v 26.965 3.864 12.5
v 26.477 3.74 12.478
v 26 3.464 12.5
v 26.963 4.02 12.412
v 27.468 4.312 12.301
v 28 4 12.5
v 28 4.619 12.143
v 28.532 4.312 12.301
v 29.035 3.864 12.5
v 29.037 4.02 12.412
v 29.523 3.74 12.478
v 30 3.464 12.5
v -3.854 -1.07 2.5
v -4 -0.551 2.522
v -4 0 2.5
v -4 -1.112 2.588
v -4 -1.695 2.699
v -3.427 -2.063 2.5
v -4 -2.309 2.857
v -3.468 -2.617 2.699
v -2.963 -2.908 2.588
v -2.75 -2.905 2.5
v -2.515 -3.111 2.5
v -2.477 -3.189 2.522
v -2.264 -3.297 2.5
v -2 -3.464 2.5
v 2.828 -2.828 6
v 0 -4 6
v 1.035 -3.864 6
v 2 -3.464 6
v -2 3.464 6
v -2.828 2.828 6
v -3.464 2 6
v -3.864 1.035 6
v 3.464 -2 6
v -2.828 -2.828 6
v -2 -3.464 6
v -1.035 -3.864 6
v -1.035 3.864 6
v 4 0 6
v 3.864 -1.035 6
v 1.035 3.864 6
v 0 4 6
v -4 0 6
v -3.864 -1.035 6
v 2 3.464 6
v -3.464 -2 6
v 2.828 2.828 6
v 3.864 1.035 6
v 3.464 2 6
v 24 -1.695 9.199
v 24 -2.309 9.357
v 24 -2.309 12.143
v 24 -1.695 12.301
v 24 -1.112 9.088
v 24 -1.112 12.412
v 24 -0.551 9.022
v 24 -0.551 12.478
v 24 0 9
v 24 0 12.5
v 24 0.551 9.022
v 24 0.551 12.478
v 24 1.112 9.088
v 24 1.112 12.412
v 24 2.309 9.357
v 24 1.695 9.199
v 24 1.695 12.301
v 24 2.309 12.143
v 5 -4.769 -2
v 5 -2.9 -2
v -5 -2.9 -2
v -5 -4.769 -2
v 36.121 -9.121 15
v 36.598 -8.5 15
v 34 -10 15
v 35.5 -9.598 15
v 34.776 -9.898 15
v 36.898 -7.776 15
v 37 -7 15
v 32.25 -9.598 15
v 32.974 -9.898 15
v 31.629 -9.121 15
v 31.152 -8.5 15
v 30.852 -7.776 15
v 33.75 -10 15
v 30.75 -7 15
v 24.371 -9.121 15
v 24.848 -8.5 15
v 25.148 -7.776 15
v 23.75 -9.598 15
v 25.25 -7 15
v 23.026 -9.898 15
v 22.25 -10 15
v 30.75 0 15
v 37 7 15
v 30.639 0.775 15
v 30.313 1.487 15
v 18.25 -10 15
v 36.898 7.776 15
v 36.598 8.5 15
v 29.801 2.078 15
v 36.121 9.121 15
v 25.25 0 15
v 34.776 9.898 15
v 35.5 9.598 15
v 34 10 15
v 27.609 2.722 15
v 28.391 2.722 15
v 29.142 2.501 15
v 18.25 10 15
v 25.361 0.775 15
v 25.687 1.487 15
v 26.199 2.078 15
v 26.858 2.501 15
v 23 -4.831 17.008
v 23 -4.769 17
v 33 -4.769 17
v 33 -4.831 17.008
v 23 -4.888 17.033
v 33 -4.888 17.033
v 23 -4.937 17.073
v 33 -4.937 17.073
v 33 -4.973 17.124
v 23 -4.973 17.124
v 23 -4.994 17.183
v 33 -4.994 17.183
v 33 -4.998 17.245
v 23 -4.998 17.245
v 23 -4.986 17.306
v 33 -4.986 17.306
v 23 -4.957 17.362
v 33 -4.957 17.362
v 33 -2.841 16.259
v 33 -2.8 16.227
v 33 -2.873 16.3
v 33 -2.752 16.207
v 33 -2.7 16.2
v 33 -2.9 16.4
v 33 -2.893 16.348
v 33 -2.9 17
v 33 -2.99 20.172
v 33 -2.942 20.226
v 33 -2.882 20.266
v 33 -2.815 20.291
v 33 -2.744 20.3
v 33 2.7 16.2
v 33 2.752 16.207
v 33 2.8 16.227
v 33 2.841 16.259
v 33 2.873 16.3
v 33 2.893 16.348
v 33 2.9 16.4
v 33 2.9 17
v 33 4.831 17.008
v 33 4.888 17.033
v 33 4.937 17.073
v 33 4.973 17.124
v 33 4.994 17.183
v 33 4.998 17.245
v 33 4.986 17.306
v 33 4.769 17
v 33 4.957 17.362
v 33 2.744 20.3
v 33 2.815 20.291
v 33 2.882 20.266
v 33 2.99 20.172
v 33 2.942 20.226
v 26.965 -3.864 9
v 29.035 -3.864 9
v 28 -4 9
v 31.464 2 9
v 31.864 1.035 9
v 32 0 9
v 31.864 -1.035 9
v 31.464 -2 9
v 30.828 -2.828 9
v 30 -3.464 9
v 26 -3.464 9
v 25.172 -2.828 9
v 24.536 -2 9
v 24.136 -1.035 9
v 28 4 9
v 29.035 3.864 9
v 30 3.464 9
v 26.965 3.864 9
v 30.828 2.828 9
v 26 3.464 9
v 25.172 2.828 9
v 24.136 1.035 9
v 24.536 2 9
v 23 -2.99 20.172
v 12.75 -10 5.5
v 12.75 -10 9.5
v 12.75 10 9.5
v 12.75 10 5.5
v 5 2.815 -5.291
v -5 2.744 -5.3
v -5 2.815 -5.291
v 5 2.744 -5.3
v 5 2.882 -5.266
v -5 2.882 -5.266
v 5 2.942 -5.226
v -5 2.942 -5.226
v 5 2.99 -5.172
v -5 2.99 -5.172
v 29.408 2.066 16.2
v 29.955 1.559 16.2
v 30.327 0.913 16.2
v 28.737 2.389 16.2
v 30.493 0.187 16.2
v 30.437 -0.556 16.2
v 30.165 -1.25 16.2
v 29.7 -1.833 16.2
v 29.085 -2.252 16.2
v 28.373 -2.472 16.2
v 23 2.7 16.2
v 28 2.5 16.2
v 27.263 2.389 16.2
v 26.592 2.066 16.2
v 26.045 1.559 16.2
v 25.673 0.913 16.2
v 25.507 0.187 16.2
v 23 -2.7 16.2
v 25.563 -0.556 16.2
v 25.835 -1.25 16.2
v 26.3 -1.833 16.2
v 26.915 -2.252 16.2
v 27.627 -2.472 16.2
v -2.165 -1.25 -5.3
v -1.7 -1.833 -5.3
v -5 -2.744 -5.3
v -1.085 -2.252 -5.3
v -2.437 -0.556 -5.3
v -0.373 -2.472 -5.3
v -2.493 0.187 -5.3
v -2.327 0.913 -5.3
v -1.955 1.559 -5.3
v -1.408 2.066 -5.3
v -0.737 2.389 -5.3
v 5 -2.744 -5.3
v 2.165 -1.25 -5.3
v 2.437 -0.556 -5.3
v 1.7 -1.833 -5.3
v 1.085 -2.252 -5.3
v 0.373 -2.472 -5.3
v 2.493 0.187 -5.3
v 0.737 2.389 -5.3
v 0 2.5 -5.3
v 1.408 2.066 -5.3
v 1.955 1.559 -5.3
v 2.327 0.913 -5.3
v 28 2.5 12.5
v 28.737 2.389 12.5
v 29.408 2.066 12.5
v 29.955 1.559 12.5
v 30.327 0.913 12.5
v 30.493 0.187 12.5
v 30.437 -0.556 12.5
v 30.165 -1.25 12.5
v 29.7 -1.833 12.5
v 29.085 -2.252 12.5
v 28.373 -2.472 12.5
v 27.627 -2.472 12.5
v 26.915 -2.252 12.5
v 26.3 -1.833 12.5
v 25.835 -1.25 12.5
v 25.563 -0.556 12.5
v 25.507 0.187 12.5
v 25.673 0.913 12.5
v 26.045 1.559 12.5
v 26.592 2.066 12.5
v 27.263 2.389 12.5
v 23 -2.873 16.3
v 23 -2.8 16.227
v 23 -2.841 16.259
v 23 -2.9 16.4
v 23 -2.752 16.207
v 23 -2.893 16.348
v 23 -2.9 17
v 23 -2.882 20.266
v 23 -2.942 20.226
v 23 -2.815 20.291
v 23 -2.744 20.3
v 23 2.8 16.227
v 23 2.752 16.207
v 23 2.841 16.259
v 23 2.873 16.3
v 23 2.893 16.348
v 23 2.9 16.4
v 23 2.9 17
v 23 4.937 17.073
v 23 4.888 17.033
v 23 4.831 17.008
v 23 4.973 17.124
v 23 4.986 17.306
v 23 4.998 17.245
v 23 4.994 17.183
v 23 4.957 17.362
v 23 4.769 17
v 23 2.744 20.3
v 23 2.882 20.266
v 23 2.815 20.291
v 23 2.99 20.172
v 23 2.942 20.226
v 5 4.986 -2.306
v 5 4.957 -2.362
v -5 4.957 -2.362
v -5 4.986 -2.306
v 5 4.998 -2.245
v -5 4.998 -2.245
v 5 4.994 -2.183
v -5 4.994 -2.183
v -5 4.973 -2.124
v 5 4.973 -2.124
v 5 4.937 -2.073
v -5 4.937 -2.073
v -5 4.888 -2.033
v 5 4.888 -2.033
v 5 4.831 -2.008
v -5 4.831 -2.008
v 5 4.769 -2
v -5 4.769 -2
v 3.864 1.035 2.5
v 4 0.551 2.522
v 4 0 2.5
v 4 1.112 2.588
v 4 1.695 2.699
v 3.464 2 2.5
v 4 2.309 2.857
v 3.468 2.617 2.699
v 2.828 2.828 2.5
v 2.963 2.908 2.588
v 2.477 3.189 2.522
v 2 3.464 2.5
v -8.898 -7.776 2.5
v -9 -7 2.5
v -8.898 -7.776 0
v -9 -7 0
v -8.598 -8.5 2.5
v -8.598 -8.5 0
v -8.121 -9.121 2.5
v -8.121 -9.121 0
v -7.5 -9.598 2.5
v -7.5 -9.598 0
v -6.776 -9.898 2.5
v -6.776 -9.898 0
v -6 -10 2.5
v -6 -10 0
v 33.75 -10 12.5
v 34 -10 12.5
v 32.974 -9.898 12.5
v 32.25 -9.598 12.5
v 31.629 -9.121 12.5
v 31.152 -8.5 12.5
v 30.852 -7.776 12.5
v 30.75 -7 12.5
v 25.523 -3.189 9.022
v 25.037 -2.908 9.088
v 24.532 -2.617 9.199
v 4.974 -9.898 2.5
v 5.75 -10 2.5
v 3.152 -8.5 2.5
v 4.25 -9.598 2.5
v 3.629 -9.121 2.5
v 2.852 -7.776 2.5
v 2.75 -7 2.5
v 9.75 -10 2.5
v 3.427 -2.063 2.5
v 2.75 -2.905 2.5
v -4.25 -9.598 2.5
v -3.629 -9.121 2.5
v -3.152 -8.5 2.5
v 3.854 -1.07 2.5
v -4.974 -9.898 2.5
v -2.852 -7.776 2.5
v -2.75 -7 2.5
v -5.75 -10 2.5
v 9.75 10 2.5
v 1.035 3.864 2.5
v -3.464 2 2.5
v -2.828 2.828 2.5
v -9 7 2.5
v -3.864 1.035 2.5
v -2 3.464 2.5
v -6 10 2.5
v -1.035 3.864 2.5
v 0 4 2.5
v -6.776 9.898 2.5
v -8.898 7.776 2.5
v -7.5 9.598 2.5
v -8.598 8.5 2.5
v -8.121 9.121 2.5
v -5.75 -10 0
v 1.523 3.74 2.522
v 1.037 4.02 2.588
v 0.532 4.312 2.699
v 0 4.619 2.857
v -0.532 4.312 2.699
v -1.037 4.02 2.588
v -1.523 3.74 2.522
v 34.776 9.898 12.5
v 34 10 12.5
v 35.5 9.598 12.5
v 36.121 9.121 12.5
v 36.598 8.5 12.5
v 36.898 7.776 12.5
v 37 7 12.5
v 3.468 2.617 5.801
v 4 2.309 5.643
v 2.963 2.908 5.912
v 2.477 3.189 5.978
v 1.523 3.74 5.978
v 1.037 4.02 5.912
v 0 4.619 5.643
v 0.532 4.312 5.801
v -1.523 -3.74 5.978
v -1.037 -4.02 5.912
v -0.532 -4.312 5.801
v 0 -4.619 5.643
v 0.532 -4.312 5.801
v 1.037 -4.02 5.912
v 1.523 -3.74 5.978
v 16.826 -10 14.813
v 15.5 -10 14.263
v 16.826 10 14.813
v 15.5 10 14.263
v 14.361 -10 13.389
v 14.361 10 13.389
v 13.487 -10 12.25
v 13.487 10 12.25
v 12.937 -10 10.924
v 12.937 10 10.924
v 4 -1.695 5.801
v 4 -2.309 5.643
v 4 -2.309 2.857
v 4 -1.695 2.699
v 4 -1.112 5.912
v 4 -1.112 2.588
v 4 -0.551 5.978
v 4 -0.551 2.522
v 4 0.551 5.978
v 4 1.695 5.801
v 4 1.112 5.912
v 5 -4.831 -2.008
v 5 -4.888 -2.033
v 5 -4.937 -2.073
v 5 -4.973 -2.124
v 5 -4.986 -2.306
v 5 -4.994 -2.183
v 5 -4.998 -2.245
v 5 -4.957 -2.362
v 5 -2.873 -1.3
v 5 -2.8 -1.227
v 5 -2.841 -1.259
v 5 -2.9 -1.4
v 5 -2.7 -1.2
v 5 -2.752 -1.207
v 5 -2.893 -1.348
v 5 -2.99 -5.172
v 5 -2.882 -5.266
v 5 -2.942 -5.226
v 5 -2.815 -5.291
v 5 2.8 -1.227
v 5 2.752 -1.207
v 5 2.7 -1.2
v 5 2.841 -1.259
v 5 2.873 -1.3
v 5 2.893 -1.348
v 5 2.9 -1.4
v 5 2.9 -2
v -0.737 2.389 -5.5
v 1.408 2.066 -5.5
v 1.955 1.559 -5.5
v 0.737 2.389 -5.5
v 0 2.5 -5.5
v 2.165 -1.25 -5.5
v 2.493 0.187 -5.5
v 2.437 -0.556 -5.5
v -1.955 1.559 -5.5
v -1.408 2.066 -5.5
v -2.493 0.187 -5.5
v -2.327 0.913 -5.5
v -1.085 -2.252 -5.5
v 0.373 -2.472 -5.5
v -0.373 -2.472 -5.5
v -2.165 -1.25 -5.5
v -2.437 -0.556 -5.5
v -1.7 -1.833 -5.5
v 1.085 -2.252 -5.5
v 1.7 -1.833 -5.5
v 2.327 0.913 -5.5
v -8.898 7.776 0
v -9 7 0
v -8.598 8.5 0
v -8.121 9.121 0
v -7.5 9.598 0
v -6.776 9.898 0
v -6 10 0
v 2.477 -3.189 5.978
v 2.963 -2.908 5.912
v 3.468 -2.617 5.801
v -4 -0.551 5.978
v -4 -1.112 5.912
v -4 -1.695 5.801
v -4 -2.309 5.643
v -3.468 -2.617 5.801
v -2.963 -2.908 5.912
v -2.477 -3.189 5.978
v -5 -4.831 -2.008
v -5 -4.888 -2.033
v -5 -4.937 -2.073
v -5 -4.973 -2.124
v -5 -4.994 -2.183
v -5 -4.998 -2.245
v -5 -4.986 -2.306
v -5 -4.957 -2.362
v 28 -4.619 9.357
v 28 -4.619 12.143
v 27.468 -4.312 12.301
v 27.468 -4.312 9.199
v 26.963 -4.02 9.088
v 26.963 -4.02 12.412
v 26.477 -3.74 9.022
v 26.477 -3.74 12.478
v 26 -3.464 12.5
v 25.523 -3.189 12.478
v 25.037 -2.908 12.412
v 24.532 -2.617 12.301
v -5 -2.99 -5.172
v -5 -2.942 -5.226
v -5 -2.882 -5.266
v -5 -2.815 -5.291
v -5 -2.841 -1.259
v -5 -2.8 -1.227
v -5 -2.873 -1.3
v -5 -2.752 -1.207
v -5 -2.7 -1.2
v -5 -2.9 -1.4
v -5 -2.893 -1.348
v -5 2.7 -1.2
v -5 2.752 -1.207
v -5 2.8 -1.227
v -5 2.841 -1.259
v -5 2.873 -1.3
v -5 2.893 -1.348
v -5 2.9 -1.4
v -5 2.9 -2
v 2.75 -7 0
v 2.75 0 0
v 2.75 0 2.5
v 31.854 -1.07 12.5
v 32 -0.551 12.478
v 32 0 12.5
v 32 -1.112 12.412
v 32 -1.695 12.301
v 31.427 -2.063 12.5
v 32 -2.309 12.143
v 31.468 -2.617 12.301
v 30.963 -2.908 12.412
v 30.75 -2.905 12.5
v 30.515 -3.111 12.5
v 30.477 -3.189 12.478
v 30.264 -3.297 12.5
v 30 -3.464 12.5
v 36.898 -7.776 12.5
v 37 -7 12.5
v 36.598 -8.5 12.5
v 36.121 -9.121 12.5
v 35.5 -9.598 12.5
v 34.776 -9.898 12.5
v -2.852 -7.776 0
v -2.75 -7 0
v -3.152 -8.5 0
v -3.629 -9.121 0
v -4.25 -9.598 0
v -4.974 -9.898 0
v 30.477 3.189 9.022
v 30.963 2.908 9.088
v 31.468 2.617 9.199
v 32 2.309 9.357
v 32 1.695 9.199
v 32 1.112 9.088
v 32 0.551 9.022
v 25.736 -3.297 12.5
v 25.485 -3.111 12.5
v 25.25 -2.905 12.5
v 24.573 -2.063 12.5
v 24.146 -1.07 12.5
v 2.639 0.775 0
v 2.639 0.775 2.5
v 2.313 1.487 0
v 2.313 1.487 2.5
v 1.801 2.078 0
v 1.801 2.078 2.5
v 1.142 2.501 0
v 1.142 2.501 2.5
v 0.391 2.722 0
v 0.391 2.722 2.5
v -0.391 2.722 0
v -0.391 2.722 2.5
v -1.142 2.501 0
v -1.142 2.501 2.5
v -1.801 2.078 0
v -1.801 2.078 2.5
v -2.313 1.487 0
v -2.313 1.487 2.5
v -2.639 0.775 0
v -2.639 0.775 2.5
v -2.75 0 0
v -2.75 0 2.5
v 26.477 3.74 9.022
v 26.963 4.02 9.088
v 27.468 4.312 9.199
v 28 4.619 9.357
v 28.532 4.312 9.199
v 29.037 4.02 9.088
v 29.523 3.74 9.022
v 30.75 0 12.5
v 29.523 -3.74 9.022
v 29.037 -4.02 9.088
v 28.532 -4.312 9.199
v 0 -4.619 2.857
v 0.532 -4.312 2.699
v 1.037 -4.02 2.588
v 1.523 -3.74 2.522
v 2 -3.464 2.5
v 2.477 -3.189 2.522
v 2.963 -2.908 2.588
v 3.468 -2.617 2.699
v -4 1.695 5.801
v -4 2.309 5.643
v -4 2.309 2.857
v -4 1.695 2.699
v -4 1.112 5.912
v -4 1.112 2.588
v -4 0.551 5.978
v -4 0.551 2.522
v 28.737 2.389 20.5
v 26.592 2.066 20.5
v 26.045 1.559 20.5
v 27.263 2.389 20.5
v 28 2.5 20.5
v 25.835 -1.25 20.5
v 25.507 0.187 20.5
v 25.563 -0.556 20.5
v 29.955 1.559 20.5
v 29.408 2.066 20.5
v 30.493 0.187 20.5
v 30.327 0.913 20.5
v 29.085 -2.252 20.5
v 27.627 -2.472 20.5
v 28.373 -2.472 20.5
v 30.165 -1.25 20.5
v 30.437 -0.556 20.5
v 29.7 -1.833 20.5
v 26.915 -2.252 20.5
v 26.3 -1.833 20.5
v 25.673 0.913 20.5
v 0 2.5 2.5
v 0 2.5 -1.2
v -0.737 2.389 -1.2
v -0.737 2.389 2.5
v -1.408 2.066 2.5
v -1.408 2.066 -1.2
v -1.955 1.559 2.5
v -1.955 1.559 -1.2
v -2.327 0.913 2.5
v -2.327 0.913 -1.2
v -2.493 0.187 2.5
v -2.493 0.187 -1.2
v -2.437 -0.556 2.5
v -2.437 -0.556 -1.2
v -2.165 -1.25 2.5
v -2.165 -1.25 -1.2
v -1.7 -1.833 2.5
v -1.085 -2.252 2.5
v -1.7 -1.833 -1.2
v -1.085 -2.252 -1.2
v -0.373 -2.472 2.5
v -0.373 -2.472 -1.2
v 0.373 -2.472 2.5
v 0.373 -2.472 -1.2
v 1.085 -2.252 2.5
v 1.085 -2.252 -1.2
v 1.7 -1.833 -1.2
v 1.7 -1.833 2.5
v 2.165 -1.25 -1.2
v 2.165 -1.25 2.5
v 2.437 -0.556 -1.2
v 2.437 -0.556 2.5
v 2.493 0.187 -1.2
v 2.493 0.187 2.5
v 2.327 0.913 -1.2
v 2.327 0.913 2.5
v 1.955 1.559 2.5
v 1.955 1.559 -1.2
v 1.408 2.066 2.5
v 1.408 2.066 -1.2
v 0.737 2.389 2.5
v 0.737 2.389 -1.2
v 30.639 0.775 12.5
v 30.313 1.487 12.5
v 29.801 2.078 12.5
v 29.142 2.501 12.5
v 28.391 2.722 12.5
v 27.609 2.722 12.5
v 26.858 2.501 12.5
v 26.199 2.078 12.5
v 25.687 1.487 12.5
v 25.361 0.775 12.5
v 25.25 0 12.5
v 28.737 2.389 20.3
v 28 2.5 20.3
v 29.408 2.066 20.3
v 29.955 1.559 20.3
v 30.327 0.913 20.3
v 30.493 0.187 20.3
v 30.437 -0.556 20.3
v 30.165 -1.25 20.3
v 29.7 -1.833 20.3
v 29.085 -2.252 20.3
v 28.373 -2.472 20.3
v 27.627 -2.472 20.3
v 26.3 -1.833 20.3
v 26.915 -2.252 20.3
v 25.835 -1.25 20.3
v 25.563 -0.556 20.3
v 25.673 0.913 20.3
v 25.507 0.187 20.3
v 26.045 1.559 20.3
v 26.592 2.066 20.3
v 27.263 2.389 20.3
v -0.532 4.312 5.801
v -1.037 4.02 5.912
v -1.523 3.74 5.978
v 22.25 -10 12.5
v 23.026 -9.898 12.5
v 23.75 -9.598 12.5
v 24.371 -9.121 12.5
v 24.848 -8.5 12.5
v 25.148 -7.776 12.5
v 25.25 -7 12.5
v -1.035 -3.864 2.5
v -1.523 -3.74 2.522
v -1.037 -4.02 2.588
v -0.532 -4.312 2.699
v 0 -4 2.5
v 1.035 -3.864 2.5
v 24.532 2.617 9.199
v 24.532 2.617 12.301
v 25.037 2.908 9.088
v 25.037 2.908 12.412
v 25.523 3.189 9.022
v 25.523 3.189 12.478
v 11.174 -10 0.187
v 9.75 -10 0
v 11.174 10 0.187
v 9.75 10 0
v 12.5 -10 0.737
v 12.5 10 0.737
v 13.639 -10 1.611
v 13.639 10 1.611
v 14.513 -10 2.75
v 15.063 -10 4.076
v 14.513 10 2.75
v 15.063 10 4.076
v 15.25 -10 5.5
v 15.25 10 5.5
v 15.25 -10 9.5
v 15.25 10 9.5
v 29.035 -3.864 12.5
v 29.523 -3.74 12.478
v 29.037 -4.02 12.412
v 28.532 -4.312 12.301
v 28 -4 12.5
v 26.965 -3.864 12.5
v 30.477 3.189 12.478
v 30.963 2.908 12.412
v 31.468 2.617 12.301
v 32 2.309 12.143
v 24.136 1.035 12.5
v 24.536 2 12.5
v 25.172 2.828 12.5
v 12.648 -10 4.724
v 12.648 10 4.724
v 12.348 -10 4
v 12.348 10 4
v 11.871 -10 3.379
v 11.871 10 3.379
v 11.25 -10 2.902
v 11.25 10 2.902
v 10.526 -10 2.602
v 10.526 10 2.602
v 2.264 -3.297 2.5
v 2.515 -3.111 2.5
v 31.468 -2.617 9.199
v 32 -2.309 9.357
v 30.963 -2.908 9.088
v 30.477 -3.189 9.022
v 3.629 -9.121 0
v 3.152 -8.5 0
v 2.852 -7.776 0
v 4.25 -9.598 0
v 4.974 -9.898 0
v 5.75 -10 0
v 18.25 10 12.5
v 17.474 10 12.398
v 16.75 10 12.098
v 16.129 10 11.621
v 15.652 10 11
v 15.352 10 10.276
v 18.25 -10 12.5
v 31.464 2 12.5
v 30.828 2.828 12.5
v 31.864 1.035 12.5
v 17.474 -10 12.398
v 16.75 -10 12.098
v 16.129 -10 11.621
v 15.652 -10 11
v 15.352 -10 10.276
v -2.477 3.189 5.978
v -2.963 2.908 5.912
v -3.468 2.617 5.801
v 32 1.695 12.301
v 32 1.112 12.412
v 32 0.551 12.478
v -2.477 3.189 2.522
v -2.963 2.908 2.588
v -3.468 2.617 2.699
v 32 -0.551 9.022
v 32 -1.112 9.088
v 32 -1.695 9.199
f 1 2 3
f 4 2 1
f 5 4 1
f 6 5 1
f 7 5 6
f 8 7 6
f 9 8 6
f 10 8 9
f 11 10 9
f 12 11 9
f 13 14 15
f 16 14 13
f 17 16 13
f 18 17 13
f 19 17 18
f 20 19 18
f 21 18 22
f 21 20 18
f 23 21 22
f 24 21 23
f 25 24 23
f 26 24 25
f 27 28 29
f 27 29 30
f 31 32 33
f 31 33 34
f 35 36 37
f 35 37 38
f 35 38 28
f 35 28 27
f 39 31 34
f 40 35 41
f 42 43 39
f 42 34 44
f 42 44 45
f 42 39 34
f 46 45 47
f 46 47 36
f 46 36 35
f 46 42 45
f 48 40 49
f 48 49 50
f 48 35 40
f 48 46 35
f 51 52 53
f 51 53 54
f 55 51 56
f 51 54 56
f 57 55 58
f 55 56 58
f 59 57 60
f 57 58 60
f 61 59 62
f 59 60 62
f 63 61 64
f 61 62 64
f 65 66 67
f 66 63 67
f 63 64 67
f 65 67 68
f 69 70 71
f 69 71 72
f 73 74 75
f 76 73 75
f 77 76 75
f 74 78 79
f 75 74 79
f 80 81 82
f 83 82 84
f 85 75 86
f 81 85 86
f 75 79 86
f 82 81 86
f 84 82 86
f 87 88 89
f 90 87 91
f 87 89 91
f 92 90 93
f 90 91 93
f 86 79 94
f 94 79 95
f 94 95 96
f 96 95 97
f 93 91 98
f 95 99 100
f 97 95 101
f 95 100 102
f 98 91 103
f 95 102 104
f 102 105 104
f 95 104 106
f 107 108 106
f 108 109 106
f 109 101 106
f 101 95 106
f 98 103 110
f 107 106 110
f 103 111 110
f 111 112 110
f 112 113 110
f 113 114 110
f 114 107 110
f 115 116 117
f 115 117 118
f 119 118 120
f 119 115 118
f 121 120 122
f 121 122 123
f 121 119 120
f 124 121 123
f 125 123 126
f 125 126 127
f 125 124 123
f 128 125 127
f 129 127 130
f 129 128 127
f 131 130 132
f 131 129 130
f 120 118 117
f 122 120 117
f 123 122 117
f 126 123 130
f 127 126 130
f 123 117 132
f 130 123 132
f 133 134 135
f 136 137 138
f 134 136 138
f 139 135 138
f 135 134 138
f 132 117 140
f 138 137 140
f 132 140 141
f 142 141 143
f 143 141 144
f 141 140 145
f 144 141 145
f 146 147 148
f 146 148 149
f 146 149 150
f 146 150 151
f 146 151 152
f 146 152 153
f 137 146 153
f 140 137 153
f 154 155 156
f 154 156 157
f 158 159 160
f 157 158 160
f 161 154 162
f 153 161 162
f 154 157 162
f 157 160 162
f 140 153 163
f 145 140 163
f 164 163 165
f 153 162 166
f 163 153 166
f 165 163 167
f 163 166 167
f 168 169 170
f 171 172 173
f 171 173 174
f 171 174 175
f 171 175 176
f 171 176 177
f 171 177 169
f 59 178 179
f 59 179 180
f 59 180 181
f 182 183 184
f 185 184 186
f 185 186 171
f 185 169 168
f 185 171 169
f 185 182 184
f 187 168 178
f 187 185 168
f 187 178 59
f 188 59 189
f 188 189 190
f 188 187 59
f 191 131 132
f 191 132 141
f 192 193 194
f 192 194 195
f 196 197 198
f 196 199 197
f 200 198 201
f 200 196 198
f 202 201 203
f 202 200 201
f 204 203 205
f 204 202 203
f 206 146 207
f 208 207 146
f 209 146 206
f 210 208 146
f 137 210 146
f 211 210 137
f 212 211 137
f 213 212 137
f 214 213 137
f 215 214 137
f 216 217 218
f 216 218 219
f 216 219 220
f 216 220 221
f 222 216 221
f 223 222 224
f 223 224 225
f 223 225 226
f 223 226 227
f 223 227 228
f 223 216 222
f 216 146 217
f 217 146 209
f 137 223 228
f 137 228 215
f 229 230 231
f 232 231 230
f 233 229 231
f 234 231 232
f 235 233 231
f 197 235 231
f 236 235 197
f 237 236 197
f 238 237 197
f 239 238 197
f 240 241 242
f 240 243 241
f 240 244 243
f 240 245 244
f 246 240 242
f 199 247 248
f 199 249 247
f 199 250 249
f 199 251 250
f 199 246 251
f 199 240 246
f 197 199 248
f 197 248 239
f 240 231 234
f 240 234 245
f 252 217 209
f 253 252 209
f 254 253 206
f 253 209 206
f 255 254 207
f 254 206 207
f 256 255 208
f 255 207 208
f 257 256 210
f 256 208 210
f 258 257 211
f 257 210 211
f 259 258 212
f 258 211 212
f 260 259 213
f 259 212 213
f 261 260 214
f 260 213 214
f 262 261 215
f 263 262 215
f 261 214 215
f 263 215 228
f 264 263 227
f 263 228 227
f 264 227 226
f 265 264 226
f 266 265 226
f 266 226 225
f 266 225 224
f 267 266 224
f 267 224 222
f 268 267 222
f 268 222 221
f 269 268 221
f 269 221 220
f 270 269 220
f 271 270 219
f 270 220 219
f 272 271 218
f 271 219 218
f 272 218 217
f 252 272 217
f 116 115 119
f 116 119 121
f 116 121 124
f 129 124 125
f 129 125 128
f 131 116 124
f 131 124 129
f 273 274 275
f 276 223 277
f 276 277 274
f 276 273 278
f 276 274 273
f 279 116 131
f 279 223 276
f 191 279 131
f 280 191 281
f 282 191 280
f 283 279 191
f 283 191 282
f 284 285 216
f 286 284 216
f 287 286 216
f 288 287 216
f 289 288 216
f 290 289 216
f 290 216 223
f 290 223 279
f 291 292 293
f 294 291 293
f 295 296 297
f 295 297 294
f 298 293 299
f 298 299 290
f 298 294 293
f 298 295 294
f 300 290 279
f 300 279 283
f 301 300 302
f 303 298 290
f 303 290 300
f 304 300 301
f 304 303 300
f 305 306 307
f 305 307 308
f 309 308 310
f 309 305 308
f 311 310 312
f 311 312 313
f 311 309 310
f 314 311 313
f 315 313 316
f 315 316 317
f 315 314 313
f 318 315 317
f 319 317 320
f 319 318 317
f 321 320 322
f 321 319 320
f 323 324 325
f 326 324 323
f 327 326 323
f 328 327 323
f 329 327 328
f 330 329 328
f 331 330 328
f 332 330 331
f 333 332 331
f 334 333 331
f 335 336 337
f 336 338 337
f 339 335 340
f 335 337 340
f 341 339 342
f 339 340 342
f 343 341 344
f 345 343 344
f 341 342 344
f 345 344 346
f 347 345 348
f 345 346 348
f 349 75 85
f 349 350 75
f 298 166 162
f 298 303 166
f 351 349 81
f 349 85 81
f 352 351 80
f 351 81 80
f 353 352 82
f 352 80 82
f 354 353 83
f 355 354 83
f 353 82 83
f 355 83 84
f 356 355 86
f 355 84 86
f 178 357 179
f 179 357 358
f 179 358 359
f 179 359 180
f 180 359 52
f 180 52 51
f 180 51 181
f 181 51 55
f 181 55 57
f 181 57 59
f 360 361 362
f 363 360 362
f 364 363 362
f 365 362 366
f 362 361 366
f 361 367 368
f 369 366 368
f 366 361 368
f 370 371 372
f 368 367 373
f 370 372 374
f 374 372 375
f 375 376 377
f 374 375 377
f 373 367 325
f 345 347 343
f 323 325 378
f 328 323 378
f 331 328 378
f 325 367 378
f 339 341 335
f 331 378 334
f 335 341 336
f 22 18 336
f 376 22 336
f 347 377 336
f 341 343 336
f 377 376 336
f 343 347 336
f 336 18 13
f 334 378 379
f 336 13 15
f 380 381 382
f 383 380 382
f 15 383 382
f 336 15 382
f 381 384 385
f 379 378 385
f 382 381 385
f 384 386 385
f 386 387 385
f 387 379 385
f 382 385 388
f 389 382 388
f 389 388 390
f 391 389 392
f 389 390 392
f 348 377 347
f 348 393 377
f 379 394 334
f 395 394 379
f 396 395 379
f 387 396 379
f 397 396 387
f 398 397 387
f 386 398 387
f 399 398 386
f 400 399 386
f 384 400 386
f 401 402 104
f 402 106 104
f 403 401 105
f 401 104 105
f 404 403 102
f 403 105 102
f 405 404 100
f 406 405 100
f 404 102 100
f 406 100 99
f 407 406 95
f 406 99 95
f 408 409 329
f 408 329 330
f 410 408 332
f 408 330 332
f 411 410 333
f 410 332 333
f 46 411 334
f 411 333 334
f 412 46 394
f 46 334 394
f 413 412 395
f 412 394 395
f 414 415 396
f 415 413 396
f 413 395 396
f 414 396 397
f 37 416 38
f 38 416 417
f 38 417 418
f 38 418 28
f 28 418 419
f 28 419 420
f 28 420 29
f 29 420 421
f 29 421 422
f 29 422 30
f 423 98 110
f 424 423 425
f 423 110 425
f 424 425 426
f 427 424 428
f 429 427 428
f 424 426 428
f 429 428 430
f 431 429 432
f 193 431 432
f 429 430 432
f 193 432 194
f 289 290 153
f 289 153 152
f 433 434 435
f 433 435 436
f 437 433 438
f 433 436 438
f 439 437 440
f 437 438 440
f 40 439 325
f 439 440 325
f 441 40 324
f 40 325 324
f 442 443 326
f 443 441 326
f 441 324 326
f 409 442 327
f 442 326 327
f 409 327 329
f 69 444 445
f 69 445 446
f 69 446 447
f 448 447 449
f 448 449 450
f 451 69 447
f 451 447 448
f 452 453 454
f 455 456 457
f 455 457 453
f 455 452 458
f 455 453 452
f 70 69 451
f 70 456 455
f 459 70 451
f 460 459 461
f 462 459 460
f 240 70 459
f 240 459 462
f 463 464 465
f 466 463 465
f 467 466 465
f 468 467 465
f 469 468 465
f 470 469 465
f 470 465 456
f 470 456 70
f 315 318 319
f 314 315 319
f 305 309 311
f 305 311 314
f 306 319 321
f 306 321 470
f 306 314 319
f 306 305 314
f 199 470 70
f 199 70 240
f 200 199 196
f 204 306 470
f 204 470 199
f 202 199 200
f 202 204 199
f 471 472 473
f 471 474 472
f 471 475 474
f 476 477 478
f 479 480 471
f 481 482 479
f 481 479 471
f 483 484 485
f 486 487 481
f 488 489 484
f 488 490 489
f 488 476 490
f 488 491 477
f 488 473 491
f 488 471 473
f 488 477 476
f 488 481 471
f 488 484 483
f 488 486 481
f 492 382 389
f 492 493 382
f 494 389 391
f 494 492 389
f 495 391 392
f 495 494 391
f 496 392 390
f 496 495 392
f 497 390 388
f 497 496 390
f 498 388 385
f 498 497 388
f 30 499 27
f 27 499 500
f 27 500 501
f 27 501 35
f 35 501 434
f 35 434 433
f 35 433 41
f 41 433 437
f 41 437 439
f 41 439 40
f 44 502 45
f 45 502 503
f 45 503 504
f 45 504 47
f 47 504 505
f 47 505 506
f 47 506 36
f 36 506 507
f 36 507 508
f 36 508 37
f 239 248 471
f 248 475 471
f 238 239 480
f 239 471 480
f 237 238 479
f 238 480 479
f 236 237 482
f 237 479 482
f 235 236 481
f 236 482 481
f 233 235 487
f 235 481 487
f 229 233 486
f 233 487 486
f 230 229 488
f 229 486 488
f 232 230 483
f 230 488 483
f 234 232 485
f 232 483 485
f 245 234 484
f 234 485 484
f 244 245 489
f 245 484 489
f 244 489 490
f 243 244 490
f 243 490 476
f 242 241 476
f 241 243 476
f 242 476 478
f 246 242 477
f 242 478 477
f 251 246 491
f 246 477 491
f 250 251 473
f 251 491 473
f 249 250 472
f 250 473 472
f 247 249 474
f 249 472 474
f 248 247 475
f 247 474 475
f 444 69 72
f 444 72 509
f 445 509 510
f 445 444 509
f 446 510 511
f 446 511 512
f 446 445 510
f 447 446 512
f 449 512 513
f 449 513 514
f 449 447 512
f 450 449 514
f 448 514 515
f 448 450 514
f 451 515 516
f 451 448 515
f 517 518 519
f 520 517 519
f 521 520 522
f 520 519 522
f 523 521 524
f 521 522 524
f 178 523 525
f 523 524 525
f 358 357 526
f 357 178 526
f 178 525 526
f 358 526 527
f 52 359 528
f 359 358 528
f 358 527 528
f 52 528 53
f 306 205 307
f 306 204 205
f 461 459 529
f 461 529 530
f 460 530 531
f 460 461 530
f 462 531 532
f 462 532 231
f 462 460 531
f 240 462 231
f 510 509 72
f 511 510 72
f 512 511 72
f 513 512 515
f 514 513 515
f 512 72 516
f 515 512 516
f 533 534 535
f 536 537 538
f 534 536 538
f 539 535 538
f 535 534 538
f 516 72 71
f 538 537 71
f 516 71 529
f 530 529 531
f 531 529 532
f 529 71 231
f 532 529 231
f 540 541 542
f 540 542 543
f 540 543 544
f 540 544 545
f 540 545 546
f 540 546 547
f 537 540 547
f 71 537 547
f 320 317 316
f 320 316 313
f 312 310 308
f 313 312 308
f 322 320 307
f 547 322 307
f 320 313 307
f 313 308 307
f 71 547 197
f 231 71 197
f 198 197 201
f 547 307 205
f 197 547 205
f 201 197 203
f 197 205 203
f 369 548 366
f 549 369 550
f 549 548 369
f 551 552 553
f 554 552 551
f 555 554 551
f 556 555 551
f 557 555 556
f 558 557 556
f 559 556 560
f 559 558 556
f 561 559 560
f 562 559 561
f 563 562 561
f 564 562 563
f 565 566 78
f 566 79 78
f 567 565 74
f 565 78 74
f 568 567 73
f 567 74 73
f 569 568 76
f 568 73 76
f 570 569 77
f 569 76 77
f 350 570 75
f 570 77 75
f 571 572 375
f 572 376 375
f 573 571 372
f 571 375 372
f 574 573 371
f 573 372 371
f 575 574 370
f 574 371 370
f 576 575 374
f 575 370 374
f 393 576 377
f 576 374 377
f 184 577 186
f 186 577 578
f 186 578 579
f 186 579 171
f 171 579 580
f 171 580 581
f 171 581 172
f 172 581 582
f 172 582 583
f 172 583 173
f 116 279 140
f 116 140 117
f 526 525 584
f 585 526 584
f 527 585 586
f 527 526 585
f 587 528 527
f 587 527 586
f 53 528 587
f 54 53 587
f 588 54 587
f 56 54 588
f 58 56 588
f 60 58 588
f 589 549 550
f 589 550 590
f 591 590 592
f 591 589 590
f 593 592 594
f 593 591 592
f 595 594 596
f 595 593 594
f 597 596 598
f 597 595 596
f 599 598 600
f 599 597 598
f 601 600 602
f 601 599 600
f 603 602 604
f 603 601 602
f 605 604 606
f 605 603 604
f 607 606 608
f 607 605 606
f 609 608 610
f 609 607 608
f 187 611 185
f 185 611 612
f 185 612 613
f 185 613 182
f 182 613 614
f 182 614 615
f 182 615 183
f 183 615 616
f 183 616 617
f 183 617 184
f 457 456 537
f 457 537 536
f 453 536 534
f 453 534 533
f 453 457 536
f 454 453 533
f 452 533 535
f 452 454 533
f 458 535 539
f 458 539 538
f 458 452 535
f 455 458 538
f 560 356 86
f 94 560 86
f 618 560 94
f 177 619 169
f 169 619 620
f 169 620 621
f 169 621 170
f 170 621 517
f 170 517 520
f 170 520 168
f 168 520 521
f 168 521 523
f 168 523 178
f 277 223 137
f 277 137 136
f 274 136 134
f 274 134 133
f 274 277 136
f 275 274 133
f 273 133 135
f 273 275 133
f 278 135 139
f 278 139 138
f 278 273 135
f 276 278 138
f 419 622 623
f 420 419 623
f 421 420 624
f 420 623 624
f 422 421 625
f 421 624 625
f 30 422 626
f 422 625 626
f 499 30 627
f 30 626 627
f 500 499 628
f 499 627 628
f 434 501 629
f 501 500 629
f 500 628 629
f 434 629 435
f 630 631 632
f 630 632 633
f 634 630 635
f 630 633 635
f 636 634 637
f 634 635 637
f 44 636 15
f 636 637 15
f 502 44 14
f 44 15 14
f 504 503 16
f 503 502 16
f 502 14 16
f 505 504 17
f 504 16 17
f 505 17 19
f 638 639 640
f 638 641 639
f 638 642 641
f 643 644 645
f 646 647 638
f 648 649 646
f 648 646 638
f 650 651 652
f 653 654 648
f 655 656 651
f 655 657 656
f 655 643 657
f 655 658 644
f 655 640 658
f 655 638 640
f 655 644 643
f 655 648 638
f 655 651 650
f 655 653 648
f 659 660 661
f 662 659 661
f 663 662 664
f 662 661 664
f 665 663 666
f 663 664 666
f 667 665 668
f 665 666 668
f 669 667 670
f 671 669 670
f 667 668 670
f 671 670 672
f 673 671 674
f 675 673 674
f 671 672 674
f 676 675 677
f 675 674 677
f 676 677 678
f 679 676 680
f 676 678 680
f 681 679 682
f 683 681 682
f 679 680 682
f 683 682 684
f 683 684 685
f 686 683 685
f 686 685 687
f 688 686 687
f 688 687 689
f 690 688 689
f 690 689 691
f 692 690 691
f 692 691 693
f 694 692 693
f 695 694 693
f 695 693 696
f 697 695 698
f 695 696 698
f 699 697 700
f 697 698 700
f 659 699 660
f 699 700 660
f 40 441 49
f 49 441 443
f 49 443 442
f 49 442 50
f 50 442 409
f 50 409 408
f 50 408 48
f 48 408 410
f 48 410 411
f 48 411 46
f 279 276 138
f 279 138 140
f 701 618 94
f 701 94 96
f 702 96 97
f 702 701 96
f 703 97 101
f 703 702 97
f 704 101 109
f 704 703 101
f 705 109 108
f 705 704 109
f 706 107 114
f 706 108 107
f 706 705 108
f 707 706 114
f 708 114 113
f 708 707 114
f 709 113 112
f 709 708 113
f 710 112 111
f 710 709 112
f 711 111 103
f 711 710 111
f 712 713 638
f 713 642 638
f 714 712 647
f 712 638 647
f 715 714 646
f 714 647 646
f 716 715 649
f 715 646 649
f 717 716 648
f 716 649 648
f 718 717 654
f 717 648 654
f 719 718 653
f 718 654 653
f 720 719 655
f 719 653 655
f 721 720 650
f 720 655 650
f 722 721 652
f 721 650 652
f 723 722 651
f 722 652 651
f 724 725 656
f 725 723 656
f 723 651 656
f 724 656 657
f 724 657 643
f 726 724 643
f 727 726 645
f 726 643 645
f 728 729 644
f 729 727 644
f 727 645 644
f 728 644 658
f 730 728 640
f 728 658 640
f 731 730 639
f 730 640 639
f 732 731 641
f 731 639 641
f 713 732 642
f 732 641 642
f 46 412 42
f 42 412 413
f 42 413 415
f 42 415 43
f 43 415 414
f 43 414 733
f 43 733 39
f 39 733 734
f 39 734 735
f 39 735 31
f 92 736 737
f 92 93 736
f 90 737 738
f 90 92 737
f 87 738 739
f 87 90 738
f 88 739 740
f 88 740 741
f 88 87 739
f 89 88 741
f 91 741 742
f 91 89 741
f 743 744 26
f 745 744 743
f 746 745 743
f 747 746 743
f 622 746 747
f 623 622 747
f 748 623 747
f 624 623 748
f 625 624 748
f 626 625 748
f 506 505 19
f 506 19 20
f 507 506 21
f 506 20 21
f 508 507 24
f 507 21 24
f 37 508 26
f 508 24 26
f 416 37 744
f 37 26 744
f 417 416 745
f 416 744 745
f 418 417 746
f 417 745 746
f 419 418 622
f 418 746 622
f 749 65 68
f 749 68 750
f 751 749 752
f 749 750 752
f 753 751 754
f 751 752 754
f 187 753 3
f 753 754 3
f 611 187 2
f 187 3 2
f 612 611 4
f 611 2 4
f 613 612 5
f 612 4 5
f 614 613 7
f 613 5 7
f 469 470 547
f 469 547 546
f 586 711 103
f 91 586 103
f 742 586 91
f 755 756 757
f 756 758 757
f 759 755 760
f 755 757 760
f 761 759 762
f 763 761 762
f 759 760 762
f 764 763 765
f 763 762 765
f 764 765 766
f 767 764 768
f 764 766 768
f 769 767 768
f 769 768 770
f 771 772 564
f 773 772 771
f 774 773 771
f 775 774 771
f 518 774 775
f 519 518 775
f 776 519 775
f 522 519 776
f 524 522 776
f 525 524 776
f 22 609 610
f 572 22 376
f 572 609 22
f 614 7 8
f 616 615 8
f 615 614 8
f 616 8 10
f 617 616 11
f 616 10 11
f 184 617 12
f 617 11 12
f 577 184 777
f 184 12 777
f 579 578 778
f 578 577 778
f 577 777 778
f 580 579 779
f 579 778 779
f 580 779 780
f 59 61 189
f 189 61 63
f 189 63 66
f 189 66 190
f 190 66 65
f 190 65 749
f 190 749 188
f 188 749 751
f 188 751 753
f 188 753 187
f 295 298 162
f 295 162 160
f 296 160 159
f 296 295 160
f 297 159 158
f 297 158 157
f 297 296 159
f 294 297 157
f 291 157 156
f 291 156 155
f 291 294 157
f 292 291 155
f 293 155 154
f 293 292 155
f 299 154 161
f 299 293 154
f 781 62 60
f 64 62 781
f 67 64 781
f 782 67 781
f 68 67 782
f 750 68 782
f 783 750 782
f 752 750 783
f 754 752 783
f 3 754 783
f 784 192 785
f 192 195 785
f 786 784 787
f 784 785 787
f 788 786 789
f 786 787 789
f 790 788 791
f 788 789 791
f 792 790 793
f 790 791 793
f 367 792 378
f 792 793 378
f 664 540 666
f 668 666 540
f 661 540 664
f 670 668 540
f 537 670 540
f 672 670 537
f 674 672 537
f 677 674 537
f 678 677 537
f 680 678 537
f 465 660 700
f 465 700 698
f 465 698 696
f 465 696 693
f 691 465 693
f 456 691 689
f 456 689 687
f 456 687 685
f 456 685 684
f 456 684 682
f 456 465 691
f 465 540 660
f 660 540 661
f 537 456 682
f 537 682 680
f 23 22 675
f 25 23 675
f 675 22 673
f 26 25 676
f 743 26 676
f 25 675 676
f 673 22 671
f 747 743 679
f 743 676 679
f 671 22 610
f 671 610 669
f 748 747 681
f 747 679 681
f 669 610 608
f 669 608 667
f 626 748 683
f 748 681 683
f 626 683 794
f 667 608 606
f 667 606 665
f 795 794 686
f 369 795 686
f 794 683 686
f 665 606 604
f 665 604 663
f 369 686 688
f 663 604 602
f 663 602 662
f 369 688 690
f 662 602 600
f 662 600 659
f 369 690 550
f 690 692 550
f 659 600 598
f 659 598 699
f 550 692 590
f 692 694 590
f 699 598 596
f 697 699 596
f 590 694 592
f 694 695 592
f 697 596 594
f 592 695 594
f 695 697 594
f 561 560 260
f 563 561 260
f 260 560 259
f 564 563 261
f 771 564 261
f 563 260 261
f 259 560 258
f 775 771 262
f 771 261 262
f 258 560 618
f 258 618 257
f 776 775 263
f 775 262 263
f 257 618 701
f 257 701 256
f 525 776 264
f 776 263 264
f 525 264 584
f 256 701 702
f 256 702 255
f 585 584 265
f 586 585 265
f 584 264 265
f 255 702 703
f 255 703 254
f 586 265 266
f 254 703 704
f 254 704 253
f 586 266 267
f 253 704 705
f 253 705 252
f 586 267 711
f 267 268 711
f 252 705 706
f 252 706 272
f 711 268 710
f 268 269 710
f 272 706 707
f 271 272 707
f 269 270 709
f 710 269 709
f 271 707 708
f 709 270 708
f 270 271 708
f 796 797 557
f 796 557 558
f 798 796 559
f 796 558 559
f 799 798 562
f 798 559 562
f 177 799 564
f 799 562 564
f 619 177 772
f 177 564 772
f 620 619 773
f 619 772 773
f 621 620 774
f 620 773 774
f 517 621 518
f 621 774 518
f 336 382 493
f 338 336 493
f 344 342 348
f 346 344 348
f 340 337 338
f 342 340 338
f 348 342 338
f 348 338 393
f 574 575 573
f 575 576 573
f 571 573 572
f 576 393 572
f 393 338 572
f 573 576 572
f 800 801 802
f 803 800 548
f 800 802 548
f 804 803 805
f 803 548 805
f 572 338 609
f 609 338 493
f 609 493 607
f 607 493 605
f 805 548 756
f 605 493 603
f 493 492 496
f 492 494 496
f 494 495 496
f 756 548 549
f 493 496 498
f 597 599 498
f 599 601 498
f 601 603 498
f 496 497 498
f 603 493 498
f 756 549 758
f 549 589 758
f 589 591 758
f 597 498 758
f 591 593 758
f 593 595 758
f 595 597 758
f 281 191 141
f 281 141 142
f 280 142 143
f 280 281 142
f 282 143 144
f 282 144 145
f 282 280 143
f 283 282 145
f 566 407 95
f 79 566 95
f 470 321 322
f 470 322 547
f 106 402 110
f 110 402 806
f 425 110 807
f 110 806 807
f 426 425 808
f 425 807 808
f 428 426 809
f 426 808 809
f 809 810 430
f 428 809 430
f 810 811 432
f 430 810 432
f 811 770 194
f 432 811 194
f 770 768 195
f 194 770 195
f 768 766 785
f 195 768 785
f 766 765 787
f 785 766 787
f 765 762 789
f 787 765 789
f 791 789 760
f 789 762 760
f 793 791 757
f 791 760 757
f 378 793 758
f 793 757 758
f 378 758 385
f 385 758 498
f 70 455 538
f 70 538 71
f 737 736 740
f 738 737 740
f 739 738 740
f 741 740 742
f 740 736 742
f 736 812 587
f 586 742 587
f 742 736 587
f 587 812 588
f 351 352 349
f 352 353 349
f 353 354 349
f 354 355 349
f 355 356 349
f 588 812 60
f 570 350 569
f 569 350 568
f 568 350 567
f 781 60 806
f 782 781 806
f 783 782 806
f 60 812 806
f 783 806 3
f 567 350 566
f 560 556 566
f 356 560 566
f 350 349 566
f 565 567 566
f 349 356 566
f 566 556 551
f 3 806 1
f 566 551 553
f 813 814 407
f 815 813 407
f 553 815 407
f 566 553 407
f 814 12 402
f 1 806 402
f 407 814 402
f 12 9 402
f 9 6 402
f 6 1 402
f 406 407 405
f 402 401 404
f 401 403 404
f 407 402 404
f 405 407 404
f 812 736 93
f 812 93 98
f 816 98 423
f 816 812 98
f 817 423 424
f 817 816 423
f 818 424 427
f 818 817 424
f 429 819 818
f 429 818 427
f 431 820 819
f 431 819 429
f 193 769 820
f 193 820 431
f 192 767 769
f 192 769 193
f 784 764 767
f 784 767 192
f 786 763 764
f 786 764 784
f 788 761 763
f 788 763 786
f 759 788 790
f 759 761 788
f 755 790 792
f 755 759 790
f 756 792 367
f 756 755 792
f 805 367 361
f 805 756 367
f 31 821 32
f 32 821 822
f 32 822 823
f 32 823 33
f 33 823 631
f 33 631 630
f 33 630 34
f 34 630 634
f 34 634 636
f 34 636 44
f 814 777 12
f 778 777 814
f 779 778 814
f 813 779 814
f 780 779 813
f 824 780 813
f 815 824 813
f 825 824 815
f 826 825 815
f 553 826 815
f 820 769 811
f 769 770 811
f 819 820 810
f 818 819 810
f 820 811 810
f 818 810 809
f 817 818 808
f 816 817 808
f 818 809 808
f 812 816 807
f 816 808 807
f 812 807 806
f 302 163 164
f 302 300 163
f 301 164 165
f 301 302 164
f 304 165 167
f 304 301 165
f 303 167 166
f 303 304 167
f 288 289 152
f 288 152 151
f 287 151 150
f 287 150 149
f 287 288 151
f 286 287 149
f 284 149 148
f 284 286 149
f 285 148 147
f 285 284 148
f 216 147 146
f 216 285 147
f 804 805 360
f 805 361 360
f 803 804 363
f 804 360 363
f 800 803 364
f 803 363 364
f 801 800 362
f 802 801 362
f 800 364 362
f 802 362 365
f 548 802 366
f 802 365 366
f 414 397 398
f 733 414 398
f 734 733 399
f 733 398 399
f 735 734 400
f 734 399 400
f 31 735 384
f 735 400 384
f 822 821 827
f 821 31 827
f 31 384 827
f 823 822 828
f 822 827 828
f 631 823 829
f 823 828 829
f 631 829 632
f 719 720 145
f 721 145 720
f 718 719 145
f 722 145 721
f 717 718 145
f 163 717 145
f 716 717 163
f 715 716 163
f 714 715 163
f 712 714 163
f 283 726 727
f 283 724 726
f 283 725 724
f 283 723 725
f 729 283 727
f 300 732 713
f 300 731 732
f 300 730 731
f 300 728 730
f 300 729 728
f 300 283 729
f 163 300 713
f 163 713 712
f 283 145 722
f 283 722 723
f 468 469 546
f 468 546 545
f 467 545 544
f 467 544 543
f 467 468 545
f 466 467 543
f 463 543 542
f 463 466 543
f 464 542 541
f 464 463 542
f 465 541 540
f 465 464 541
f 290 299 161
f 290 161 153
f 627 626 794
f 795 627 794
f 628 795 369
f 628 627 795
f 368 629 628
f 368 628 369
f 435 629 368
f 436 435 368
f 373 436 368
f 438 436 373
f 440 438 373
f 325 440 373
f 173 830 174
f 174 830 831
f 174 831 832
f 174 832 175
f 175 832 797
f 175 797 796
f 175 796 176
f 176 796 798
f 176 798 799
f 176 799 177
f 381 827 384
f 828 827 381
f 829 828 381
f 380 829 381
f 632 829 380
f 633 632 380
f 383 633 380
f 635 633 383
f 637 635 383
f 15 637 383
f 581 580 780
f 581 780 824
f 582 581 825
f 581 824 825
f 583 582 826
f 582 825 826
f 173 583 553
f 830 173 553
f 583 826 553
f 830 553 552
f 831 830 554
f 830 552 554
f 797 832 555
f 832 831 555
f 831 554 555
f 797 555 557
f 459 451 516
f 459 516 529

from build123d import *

# Parameters (mm, degrees)
BOSS_EXTRUDE1_DEPTH = 10
CUT_EXTRUDE1_DEPTH  = 42.158231255
FILLET1_R           = 3
BOSS_EXTRUDE2_DEPTH = 3.5
SKETCH4_W           = 8
SKETCH4_H           = 2.5
BOSS_EXTRUDE3_DEPTH = 5
CIRPATTERN1_COUNT   = 2
CIRPATTERN1_ANGLE   = 180


with BuildPart() as part:
    # Sketch1 → Boss-Extrude1 (new, symmetric)
    with BuildSketch(Plane(origin=(0, 0, 0), x_dir=(1, 0, 0), z_dir=(0, 1, 0))):
        with BuildLine():
            Line((-9, 0), (9.75, 0))
            ThreePointArc((9.75, 0), (13.639087297, -1.610912703), (15.25, -5.5))
            Line((15.25, -5.5), (15.25, -9.5))
            ThreePointArc((15.25, -9.5), (16.128679656, -11.621320344), (18.25, -12.5))
            Line((18.25, -12.5), (37, -12.5))
            Line((37, -12.5), (37, -15))
            Line((37, -15), (18.25, -15))
            ThreePointArc((18.25, -15), (14.360912703, -13.389087297), (12.75, -9.5))
            Line((12.75, -9.5), (12.75, -5.5))
            ThreePointArc((12.75, -5.5), (11.871320344, -3.378679656), (9.75, -2.5))
            Line((9.75, -2.5), (-9, -2.5))
            Line((-9, -2.5), (-9, 0))
        make_face()
    extrude(amount=BOSS_EXTRUDE1_DEPTH, both=True)

    # Sketch2 → Cut-Extrude1 (cut, through all)
    with BuildSketch(Plane.XY):
        with BuildLine():
            Line((-2.75, 0), (-2.75, -10))
            Line((-2.75, -10), (2.75, -10))
            Line((2.75, -10), (2.75, 0))
            ThreePointArc((2.75, 0), (0, 2.75), (-2.75, 0))
        make_face()
        with BuildLine():
            Line((25.25, 0), (25.25, -10))
            Line((25.25, -10), (30.75, -10))
            Line((30.75, -10), (30.75, 0))
            ThreePointArc((30.75, 0), (28, 2.75), (25.25, 0))
        make_face()
    extrude(amount=CUT_EXTRUDE1_DEPTH, mode=Mode.SUBTRACT)

    # Fillet1
    fillet1_edges = [part.edges().sort_by_distance(p)[0] for p in [
        (37, -10, 13.75),
        (-9, -10, 1.25),
        (37, 10, 13.75),
        (2.75, -10, 1.25),
        (-2.75, -10, 1.25),
        (-9, 10, 1.25),
        (25.25, -10, 13.75),
        (30.75, -10, 13.75),
    ]]
    fillet(fillet1_edges, radius=FILLET1_R)

    # Sketch3 → Boss-Extrude2 (add)
    with BuildSketch(Plane.XY.offset(2.5)):
        Polygon((0, 4.618802154), (-4, 2.309401077), (-4, -2.309401077), (0, -4.618802154), (4, -2.309401077), (4, 2.309401077), align=None)
    boss_extrude2 = extrude(amount=BOSS_EXTRUDE2_DEPTH)

    # Sketch4 → Revolve1 (revolve)
    with BuildSketch(Plane(origin=(0, 0, 0), x_dir=(0, 0, -1), z_dir=(1, 0, 0))):
        with Locations((1.5, 1.25)):
            Rectangle(SKETCH4_W, SKETCH4_H)
    revolve1 = revolve(axis=Axis((0, 0, -5.5), (0, 0, 1)))

    # Sketch5 → Cut-Revolve1 (revolve, cut)
    with BuildSketch(Plane(origin=(0, 0, 0), x_dir=(0, 0, -1), z_dir=(1, 0, 0))):
        Polygon((-2.5, 4.618802154), (-2.5, 4), (-2.85726559, 4.618802154), align=None)
        Polygon((-5.64273441, 4.618802154), (-6, 4.618802154), (-6, 4), align=None)
    cut_revolve1 = revolve(axis=Axis((0, 0, 2.5), (0, 0, 1)), mode=Mode.SUBTRACT)

    # Sketch6 → Boss-Extrude3 (add, symmetric)
    with BuildSketch(Plane(origin=(0, 0, 0), x_dir=(0, 0, -1), z_dir=(1, 0, 0))):
        with BuildLine():
            Line((5.172072931, 2.989575498), (2.36192258, 4.957263957))
            ThreePointArc((2.36192258, 4.957263957), (2.123797819, 4.972871479), (2, 4.768858987))
            Line((2, 4.768858987), (2, 2.9))
            Line((2, 2.9), (1.4, 2.9))
            ThreePointArc((1.4, 2.9), (1.258578644, 2.841421356), (1.2, 2.7))
            Line((1.2, 2.7), (1.2, -2.7))
            ThreePointArc((1.2, -2.7), (1.258578644, -2.841421356), (1.4, -2.9))
            Line((1.4, -2.9), (2, -2.9))
            Line((2, -2.9), (2, -4.768858987))
            ThreePointArc((2, -4.768858987), (2.123797819, -4.972871479), (2.36192258, -4.957263957))
            Line((2.36192258, -4.957263957), (5.172072931, -2.989575498))
            ThreePointArc((5.172072931, -2.989575498), (5.26610325, -2.882354469), (5.3, -2.743829885))
            Line((5.3, -2.743829885), (5.3, 2.743829885))
            ThreePointArc((5.3, 2.743829885), (5.26610325, 2.882354469), (5.172072931, 2.989575498))
        make_face()
    boss_extrude3 = extrude(amount=BOSS_EXTRUDE3_DEPTH, both=True)

    # CirPattern1: Boss-Extrude2, Revolve1, Cut-Revolve1, Boss-Extrude3 ×2 about axis
    cirpattern1_axis = Axis((14, 11, 7.5), (0, -1, 0))
    add([boss_extrude2.rotate(cirpattern1_axis, i * CIRPATTERN1_ANGLE / (CIRPATTERN1_COUNT - 1)) for i in range(1, CIRPATTERN1_COUNT)])
    add([revolve1.rotate(cirpattern1_axis, i * CIRPATTERN1_ANGLE / (CIRPATTERN1_COUNT - 1)) for i in range(1, CIRPATTERN1_COUNT)])
    add([cut_revolve1.rotate(cirpattern1_axis, i * CIRPATTERN1_ANGLE / (CIRPATTERN1_COUNT - 1)) for i in range(1, CIRPATTERN1_COUNT)], mode=Mode.SUBTRACT)
    add([boss_extrude3.rotate(cirpattern1_axis, i * CIRPATTERN1_ANGLE / (CIRPATTERN1_COUNT - 1)) for i in range(1, CIRPATTERN1_COUNT)])


solid = part.part
